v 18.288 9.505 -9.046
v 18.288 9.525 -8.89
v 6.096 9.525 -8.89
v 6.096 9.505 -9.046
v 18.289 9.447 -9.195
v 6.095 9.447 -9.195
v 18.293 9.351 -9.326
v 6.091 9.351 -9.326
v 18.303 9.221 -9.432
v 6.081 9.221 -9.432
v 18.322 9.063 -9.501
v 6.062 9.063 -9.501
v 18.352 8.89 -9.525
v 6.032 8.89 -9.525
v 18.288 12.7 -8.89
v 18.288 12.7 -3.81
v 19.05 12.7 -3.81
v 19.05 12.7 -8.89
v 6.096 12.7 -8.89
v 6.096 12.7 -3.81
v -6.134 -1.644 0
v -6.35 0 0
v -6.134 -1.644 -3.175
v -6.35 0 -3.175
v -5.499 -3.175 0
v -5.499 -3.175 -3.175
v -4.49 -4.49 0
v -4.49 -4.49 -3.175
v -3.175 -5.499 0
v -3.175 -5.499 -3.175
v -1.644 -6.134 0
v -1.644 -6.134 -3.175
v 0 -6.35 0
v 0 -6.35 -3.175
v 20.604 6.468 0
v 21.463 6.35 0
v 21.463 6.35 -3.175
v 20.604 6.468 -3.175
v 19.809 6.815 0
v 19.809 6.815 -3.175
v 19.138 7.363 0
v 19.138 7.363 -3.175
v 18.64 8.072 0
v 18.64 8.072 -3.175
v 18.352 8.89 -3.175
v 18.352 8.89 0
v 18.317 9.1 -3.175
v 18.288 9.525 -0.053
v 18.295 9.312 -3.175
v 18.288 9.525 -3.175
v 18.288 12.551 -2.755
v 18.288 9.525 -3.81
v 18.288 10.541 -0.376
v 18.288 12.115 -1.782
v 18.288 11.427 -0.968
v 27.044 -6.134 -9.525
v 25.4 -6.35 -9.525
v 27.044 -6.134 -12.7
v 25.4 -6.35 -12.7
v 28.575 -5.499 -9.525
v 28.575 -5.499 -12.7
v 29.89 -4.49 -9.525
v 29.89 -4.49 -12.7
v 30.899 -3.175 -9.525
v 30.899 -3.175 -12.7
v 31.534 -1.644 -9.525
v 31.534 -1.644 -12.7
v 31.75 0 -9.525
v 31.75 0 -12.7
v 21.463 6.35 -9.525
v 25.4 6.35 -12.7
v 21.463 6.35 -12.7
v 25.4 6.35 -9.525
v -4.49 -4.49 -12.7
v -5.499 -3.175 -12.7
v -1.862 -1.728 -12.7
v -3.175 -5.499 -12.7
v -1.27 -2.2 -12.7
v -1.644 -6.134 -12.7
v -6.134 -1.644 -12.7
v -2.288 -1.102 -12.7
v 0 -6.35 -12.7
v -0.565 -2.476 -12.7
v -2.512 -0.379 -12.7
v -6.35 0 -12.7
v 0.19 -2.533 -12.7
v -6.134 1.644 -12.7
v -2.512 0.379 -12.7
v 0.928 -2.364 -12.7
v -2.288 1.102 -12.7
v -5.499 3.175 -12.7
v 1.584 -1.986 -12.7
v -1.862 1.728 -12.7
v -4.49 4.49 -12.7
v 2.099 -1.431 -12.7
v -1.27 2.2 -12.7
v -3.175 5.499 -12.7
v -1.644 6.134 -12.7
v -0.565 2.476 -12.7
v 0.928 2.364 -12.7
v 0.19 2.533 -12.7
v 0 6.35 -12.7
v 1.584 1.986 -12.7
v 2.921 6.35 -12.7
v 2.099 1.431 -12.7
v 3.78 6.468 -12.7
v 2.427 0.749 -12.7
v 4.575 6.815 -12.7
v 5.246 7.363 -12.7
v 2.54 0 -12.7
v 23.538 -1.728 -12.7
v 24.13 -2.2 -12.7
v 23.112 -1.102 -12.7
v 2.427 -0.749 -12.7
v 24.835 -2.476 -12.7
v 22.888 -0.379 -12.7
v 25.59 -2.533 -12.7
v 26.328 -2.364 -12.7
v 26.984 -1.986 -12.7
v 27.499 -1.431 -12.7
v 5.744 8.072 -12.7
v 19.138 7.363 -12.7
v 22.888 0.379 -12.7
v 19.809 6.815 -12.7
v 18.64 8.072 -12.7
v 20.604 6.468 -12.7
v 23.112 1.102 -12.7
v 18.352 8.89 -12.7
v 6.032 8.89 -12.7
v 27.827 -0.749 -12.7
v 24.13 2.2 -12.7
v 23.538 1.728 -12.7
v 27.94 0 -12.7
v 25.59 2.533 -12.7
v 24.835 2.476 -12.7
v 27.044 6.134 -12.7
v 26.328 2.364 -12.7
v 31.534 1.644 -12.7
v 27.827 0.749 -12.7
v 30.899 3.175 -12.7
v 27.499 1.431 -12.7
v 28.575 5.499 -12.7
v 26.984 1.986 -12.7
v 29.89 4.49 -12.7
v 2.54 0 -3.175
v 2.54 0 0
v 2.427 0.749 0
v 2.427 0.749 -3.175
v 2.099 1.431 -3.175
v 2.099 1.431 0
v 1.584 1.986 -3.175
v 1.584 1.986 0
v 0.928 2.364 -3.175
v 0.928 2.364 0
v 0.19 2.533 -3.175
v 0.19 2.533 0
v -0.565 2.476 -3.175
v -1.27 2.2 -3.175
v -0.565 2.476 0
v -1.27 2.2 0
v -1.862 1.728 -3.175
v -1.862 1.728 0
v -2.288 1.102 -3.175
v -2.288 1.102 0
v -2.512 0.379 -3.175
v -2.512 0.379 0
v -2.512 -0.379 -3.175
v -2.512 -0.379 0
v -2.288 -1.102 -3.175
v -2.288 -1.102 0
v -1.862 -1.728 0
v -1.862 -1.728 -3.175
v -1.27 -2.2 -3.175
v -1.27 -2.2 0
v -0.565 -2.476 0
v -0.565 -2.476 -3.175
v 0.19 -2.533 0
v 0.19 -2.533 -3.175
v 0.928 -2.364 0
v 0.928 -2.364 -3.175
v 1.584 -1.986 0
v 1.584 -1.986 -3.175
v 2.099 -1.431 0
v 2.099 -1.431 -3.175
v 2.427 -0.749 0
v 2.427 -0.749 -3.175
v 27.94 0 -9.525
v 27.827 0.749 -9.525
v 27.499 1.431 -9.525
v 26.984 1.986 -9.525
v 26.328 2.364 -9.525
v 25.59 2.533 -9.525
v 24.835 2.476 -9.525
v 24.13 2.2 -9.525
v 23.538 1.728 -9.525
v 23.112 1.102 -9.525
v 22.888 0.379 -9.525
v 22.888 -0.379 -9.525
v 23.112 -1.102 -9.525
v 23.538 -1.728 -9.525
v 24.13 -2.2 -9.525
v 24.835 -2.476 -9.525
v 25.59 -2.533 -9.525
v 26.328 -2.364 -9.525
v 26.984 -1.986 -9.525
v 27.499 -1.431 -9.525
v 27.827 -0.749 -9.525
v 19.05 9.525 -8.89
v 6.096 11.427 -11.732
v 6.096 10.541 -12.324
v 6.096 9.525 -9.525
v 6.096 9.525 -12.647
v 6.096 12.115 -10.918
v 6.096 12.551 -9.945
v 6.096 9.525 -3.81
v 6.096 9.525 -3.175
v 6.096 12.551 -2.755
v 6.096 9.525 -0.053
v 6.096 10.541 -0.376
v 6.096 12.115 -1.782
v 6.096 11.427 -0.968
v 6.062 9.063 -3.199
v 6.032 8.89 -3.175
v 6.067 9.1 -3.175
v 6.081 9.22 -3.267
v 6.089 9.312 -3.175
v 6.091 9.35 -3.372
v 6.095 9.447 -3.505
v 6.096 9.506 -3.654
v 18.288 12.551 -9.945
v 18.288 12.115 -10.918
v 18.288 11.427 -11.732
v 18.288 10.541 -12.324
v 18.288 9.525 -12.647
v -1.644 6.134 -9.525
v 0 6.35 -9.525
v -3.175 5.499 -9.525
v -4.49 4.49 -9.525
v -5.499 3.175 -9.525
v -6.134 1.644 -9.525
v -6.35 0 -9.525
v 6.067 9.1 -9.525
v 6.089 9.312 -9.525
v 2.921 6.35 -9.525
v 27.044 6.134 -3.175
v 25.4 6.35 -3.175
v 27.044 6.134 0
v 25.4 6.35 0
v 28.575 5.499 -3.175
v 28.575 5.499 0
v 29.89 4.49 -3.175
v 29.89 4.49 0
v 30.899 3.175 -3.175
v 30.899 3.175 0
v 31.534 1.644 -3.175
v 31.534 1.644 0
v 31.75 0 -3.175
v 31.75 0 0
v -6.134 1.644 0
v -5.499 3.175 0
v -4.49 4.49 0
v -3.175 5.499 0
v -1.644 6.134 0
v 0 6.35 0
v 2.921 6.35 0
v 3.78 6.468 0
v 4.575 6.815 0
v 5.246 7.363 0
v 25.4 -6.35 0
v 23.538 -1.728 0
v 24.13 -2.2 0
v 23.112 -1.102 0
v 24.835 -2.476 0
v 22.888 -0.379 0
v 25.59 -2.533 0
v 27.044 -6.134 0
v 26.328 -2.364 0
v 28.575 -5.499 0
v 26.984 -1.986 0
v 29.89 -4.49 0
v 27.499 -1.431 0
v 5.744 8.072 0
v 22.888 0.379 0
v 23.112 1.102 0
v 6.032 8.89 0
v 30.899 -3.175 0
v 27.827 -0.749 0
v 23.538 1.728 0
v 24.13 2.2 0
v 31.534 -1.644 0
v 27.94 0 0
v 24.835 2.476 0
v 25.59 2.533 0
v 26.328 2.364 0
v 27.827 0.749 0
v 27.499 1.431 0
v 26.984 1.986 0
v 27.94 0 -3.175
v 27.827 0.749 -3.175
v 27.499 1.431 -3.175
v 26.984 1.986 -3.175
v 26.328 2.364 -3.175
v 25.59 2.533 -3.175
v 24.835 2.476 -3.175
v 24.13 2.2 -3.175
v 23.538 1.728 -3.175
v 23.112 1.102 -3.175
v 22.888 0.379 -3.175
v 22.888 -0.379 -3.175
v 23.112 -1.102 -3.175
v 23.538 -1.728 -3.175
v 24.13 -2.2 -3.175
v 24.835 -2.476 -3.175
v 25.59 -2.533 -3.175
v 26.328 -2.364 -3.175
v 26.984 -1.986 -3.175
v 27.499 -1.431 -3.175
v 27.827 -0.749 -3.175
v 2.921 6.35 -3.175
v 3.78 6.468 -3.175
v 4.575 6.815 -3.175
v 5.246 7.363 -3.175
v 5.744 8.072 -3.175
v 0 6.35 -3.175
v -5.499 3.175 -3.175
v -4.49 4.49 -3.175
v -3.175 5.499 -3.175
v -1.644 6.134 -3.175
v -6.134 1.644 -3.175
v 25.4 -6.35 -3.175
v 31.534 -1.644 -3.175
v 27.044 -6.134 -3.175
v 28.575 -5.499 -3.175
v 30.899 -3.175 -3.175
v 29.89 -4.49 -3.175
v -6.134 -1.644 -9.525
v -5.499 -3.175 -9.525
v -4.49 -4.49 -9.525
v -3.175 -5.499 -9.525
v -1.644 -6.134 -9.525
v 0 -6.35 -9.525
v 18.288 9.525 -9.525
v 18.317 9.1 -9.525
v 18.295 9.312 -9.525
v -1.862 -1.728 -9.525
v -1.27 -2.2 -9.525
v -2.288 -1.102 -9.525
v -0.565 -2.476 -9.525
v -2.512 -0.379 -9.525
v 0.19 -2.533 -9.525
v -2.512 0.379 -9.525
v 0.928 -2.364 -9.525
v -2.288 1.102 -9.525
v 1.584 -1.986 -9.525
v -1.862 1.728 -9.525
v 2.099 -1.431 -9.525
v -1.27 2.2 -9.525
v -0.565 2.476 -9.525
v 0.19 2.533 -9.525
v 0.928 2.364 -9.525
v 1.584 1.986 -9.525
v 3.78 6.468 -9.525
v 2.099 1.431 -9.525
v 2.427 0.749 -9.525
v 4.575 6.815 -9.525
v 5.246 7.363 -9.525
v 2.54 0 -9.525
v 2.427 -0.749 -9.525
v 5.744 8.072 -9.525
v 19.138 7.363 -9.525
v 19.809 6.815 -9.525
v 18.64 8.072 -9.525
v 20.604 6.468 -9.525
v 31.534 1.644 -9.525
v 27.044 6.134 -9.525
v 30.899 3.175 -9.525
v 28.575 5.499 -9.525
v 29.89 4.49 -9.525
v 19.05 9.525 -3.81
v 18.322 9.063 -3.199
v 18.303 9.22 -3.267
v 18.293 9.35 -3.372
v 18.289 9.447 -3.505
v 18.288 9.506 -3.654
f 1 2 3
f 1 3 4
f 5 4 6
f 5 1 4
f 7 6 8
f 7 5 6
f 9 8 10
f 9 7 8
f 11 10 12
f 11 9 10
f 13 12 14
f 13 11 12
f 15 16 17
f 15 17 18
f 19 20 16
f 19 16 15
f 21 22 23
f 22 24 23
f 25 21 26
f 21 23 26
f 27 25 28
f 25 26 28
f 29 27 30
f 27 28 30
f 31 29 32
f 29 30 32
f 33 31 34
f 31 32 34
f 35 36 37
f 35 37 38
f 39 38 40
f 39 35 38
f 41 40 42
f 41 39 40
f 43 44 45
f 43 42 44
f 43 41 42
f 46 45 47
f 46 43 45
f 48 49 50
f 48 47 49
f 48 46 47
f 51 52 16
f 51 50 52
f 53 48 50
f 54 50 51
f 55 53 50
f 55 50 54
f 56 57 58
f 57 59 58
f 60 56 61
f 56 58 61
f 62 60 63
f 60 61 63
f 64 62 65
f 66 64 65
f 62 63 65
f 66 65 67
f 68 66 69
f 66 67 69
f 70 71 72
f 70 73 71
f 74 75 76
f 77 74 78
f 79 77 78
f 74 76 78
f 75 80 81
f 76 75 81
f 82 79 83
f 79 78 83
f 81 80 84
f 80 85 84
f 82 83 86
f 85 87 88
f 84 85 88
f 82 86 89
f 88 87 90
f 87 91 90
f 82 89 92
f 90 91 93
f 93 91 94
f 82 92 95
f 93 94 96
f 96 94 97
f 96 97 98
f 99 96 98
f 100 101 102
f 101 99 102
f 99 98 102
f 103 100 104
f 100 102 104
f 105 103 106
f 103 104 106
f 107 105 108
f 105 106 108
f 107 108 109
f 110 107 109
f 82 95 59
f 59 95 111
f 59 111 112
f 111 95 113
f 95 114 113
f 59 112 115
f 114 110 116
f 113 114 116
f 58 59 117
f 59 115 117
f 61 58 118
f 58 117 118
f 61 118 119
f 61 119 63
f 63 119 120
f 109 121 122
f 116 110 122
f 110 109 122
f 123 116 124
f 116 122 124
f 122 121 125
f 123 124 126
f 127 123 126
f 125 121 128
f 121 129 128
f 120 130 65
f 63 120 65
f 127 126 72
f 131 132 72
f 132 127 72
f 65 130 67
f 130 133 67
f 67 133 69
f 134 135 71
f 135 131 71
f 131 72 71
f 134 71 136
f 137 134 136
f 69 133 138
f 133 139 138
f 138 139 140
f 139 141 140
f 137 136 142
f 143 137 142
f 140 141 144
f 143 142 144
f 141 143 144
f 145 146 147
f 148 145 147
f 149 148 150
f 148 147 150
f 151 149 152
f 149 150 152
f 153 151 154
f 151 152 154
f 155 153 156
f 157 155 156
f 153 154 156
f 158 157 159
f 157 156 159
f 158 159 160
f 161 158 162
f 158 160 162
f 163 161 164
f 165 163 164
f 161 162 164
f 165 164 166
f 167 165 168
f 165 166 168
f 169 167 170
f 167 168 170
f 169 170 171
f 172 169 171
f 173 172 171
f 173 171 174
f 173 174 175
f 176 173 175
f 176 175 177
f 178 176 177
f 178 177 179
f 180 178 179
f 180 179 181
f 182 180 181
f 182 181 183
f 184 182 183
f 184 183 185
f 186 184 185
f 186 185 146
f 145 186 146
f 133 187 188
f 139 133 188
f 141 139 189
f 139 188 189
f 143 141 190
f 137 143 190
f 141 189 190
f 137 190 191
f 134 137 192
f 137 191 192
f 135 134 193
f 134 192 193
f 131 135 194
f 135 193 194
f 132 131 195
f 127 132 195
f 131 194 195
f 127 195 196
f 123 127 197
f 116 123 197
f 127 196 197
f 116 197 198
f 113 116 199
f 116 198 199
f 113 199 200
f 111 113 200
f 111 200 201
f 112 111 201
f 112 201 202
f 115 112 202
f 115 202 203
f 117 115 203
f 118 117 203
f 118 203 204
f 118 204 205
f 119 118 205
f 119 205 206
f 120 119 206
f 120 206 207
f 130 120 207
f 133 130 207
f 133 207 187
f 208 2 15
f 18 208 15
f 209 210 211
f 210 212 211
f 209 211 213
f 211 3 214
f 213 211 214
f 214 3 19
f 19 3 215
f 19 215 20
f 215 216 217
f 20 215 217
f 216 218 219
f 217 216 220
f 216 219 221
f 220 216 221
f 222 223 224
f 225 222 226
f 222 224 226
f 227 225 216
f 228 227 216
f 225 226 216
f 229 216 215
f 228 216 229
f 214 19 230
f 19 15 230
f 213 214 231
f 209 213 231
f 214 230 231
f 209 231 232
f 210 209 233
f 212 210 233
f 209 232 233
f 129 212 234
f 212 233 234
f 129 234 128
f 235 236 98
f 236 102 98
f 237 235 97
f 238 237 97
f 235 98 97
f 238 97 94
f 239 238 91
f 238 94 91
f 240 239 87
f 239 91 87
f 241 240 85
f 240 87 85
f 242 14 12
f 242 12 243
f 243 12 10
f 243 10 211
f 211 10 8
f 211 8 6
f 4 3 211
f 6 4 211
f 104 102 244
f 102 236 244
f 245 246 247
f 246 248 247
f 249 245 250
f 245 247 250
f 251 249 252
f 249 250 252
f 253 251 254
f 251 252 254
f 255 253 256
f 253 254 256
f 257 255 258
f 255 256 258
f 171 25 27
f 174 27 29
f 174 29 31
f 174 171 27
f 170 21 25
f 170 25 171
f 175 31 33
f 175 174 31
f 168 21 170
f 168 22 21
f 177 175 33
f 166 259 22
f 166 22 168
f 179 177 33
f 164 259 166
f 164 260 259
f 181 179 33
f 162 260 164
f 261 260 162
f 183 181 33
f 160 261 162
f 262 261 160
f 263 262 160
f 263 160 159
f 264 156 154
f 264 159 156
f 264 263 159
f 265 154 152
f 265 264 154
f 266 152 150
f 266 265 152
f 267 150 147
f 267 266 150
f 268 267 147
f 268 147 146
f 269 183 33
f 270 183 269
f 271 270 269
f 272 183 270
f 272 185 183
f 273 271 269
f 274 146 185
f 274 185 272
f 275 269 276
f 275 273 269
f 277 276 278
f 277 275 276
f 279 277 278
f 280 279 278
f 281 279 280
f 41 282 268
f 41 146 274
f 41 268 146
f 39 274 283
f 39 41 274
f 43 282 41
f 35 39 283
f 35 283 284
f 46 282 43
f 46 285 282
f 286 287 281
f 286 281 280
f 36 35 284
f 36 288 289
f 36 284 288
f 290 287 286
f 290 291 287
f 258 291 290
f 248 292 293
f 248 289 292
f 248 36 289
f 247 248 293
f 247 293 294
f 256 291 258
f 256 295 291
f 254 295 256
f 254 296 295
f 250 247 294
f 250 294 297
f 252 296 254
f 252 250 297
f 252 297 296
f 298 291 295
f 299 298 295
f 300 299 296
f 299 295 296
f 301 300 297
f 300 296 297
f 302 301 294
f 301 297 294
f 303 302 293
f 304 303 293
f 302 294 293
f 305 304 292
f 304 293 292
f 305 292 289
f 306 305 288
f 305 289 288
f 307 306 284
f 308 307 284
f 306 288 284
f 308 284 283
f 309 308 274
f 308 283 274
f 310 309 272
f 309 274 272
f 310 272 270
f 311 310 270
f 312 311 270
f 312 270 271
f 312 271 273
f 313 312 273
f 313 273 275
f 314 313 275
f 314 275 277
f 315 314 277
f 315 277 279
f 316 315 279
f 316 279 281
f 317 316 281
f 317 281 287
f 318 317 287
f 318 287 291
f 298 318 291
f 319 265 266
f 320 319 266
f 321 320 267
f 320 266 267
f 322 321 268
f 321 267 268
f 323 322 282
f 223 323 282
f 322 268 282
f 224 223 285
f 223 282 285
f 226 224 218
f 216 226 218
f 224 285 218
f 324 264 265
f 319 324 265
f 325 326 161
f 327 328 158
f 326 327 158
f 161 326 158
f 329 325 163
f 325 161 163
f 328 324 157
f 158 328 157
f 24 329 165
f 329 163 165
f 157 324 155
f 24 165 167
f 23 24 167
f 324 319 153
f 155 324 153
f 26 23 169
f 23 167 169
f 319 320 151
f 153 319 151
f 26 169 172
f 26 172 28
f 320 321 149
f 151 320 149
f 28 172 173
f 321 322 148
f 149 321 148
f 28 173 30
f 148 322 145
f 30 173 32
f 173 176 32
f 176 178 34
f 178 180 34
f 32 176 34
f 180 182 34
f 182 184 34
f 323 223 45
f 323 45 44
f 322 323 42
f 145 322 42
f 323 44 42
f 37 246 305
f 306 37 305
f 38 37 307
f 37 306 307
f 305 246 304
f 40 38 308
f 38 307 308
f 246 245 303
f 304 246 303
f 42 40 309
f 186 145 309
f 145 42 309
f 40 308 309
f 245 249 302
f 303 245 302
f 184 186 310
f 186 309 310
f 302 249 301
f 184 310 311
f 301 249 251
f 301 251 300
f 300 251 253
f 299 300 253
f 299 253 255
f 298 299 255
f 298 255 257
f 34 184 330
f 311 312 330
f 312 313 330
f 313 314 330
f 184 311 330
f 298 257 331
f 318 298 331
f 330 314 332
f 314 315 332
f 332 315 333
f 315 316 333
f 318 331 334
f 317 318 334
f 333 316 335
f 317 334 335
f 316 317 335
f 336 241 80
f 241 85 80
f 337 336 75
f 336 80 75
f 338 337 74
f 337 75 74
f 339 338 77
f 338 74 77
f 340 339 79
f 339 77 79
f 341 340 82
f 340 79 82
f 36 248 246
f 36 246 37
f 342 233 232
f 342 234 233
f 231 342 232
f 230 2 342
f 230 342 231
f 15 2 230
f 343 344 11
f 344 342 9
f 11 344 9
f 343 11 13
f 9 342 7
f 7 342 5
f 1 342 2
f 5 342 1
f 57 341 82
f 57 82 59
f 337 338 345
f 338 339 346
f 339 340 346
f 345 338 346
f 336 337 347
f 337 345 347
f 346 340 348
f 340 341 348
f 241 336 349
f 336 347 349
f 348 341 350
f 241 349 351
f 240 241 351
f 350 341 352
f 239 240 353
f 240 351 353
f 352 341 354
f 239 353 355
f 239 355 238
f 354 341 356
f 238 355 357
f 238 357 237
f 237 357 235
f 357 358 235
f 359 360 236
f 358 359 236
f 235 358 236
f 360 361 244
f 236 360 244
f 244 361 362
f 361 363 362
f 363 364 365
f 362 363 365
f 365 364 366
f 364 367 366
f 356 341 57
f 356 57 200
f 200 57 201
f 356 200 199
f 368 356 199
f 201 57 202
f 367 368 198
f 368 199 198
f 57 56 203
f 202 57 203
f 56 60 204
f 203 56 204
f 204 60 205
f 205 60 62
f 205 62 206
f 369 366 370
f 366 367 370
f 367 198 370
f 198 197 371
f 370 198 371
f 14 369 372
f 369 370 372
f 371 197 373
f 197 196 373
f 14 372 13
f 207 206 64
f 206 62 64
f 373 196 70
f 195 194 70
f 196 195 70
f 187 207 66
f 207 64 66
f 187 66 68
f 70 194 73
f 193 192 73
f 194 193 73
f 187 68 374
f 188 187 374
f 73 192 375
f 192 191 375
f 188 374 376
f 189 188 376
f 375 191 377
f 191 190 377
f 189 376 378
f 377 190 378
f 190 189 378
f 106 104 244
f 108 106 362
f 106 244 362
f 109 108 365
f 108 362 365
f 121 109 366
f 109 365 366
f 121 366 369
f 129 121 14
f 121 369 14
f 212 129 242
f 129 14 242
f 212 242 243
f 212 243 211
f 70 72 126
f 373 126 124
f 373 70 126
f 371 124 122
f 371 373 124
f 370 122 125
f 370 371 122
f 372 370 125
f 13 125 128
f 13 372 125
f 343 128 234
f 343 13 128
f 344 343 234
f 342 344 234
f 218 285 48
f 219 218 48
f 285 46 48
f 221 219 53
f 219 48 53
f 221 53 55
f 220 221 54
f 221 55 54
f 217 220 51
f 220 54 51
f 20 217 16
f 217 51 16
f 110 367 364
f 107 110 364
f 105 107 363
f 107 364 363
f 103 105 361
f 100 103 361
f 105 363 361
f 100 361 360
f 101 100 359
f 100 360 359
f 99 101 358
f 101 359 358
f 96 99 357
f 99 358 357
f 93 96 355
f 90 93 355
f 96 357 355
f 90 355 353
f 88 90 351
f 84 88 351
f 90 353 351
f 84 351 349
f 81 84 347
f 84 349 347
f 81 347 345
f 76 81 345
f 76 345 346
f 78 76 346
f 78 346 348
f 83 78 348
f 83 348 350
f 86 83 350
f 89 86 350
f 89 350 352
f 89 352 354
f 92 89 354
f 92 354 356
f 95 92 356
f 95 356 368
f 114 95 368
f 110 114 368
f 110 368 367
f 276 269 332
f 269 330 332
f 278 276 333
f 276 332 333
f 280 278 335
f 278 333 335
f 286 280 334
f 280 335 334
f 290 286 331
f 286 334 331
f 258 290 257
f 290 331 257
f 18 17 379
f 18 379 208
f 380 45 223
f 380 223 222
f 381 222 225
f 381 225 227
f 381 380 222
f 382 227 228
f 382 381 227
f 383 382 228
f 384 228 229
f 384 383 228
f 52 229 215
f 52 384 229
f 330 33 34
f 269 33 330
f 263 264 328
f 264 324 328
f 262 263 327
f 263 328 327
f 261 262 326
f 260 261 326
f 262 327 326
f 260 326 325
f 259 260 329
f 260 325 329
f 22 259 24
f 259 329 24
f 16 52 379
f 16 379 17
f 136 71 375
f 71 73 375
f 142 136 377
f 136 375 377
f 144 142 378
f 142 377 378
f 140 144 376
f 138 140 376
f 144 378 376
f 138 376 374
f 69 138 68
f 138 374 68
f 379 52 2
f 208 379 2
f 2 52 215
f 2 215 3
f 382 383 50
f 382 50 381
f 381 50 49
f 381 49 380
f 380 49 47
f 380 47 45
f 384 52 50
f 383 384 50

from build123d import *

# Parameters (mm, degrees)
SKETCH1_W           = 38.1
SKETCH1_H           = 19.05
SKETCH1_R           = 2.54
BASE_EXTRUDE_DEPTH  = 12.7
CUT_EXTRUDE1_DEPTH  = 43.121134838
CUT_EXTRUDE2_DEPTH  = 37.477972806
CUT_EXTRUDE3_DEPTH  = 37.477972806
FILLET1_R           = 0.635
FILLET2_R           = 3.81
FILLET3_R           = 6.35
SKETCH6_W           = 5.08
SKETCH6_H           = 3.175
BOSS_EXTRUDE1_DEPTH = 0.762


# Some blends are built 0.0001 mm under size
with BuildPart() as part:
    # Sketch1 → Base-Extrude (new body)
    with BuildSketch(Plane.XY):
        with Locations((12.7, 3.175)):
            Rectangle(SKETCH1_W, SKETCH1_H)
        Circle(SKETCH1_R, mode=Mode.SUBTRACT)
        with Locations((25.4, 0)):
            Circle(SKETCH1_R, mode=Mode.SUBTRACT)
    extrude(amount=-BASE_EXTRUDE_DEPTH)

    # Sketch3 → Cut-Extrude1 (cut, through all)
    with BuildSketch(Plane(origin=(31.75, 0, 0), x_dir=(0, 0, -1), z_dir=(1, 0, 0))):
        Polygon((3.175, -58.947094971), (3.175, -6.35), (3.175, 9.525), (9.525, 9.525), (9.525, -6.35), (9.525, -58.947094971), (9.525, -164.141284914), (3.175, -164.141284914), align=None)
    extrude(amount=-CUT_EXTRUDE1_DEPTH, mode=Mode.SUBTRACT)

    # Sketch4 → Cut-Extrude2 (cut, through all)
    with BuildSketch(Plane.XY):
        with BuildLine():
            Line((-96.671852568, 6.35), (-6.35, 6.35))
            Line((-6.35, 6.35), (2.921, 6.35))
            ThreePointArc((2.921, 6.35), (5.16606403, 7.27993597), (6.096, 9.525))
            Line((6.096, 9.525), (6.096, 12.7))
            Line((6.096, 12.7), (6.096, 103.021852568))
            Line((6.096, 103.021852568), (-117.676302849, 234.599074203))
            Line((-117.676302849, 234.599074203), (-220.444155417, 137.927221634))
            Line((-220.444155417, 137.927221634), (-96.671852568, 6.35))
        make_face()
    extrude(amount=-CUT_EXTRUDE2_DEPTH, mode=Mode.SUBTRACT)

    # Sketch5 → Cut-Extrude3 (cut, through all)
    with BuildSketch(Plane.XY):
        with BuildLine():
            Line((122.071852568, 6.35), (31.75, 6.35))
            Line((31.75, 6.35), (21.463, 6.35))
            ThreePointArc((21.463, 6.35), (19.21793597, 7.27993597), (18.288, 9.525))
            Line((18.288, 9.525), (18.288, 12.7))
            Line((18.288, 12.7), (18.288, 103.021852568))
            Line((18.288, 103.021852568), (141.41301137, 235.20498228))
            Line((141.41301137, 235.20498228), (245.196863939, 138.533129712))
            Line((245.196863939, 138.533129712), (122.071852568, 6.35))
        make_face()
    extrude(amount=-CUT_EXTRUDE3_DEPTH, mode=Mode.SUBTRACT)

    # Fillet1
    # the kernel refuses this fillet: 0.635 mm, written as the material it adds along each edge
    with BuildSketch(Plane(origin=(19.8755, 9.525, -9.525), x_dir=(0, 0, 1), z_dir=(-1, 0, 0))) as fillet1_piece_1_section:
        with BuildLine():
            CenterArc((FILLET1_R, -FILLET1_R), FILLET1_R, 90, 90)
            Line((0, -FILLET1_R), (0, 0))
            Line((0, 0), (FILLET1_R, 0))
        make_face()
    fillet1_piece_1 = extrude(amount=15.367, mode=Mode.PRIVATE)
    fillet1_piece_1 = fillet1_piece_1 - Plane(origin=(2.921, 9.525, -9.486385911), x_dir=(0, -1, 0), z_dir=(0, 0, 1)) * Cylinder(3.175, 34, mode=Mode.PRIVATE)
    fillet1_piece_1 = fillet1_piece_1 - Plane(origin=(21.463, 9.525, -9.486385911), x_dir=(0, -1, 0), z_dir=(0, 0, 1)) * Cylinder(3.175, 34, mode=Mode.PRIVATE)
    add(fillet1_piece_1)
    with BuildSketch(Plane(origin=(19.8755, 9.525, -3.175), x_dir=(0, -1, 0), z_dir=(-1, 0, 0))) as fillet1_piece_2_section:
        with BuildLine():
            CenterArc((FILLET1_R, -FILLET1_R), FILLET1_R, 90, 90)
            Line((0, -FILLET1_R), (0, 0))
            Line((0, 0), (FILLET1_R, 0))
        make_face()
    fillet1_piece_2 = extrude(amount=15.367, mode=Mode.PRIVATE)
    fillet1_piece_2 = fillet1_piece_2 - Plane(origin=(21.463, 9.525, -3.21361614), x_dir=(0, -1, 0), z_dir=(0, 0, 1)) * Cylinder(3.175, 34, mode=Mode.PRIVATE)
    fillet1_piece_2 = fillet1_piece_2 - Plane(origin=(2.921, 9.525, -3.21361614), x_dir=(0, -1, 0), z_dir=(0, 0, 1)) * Cylinder(3.175, 34, mode=Mode.PRIVATE)
    add(fillet1_piece_2)

    # Fillet2
    fillet2_edges = [part.edges().sort_by_distance(p)[0] for p in [
        (12.192, 12.7, 0),
        (12.192, 12.7, -12.7),
    ]]
    fillet(fillet2_edges, radius=FILLET2_R)

    # Fillet3
    fillet3_edges = [part.edges().sort_by_distance(p)[0] for p in [
        (-6.35, -6.35, -1.5875),
        (31.75, -6.35, -1.5875),
        (-6.35, 6.35, -1.5875),
        (-6.35, 6.35, -11.1125),
        (31.75, 6.35, -11.1125),
        (-6.35, -6.35, -11.1125),
        (31.75, 6.35, -1.5875),
        (31.75, -6.35, -11.1125),
    ]]
    fillet(fillet3_edges, radius=FILLET3_R - 0.0001)  # a hair under: the kernel refuses the full size

    # Sketch6 → Boss-Extrude1 (add)
    with BuildSketch(Plane(origin=(18.288, 0, 0), x_dir=(0, 0, -1), z_dir=(1, 0, 0))):
        with Locations((6.35, 11.1125)):
            Rectangle(SKETCH6_W, SKETCH6_H)
    extrude(amount=BOSS_EXTRUDE1_DEPTH)


solid = part.part
